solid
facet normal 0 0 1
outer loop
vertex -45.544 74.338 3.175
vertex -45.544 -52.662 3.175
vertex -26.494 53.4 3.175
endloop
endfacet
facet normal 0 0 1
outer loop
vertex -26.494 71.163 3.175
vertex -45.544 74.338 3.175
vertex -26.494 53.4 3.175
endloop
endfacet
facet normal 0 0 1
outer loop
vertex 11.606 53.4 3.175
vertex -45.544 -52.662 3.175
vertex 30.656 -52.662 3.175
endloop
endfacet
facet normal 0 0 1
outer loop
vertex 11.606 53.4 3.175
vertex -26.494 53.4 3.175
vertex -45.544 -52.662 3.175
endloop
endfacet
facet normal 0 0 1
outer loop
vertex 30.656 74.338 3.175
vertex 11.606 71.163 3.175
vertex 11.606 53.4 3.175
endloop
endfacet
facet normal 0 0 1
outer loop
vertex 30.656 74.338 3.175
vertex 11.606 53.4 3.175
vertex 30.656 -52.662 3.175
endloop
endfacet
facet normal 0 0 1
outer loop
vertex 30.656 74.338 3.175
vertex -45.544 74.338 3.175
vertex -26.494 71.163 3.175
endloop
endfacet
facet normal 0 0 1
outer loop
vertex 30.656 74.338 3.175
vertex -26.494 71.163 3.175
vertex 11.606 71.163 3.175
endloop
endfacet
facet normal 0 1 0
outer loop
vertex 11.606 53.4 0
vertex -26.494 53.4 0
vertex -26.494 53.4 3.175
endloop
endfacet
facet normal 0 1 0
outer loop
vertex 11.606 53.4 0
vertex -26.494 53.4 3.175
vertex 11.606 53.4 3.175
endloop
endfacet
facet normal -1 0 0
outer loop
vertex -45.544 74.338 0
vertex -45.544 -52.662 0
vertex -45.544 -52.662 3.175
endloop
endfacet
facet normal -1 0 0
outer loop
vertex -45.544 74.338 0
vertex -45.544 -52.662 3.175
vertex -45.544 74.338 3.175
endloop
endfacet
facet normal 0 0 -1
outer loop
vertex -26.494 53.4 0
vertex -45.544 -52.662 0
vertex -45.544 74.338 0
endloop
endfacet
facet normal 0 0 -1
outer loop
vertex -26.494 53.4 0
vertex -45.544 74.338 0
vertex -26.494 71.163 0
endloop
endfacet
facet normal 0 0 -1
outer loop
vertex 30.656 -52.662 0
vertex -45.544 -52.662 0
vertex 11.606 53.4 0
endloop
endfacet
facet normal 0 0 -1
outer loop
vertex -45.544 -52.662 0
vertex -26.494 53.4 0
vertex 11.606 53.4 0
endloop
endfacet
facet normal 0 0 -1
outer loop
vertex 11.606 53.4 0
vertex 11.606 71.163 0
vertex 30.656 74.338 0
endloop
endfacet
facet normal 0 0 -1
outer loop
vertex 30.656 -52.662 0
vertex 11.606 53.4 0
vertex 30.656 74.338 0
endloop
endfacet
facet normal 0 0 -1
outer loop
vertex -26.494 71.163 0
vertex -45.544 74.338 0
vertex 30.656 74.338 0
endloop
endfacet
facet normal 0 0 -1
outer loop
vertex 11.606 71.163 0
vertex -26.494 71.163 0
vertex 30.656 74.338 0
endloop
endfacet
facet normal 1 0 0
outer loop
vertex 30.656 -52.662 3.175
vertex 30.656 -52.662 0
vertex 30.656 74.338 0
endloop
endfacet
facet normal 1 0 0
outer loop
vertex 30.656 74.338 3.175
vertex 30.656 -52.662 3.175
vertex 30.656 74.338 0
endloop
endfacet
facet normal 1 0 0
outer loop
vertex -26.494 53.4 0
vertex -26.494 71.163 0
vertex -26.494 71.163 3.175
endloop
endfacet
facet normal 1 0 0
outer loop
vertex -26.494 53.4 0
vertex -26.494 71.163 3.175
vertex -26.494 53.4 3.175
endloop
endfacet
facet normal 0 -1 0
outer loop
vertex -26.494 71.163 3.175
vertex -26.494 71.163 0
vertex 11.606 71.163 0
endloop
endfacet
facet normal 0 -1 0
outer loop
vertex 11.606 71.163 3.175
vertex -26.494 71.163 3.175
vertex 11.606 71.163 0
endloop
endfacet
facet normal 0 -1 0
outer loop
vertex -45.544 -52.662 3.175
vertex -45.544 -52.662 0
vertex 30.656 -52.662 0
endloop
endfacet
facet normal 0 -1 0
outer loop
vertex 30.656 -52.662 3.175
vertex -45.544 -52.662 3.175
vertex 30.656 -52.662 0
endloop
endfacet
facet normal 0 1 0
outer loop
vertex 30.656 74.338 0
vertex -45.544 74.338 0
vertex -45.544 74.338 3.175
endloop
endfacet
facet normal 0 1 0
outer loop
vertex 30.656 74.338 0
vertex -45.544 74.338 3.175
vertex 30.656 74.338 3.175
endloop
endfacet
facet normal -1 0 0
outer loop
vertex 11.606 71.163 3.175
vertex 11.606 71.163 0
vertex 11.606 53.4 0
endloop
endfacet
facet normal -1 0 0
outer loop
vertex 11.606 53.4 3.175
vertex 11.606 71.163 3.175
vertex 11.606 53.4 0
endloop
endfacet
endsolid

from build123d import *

# Parameters (mm, degrees)
F0_W     = 76.2
F0_H     = 127
F1_DEPTH = 3.175
F2_W     = 38.1
F2_H     = 17.7633663237
F3_DEPTH = 3.175


# Not quite as in the source:
# - a length typed as a fraction of an inch, garbled in the dataset ("3 / 203.2 mm" for 3/8 in), is restored


with BuildPart() as f1:
    # F0 (on Top) → F1 (new body)
    with BuildSketch(Plane.XY):
        with Locations((-7.4443402648, 10.8384059966)):
            Rectangle(F0_W, F0_H)
    extrude(amount=F1_DEPTH)

    # F2 (on face) → F3 (cut)
    with BuildSketch(Plane(origin=(0, 0, 0), x_dir=(1, 0, 0), z_dir=(0, 0, -1))):
        with Locations((-7.4443402648, -62.2817228347)):
            Rectangle(F2_W, F2_H)
    extrude(amount=-F3_DEPTH, mode=Mode.SUBTRACT)


solid = f1.part
